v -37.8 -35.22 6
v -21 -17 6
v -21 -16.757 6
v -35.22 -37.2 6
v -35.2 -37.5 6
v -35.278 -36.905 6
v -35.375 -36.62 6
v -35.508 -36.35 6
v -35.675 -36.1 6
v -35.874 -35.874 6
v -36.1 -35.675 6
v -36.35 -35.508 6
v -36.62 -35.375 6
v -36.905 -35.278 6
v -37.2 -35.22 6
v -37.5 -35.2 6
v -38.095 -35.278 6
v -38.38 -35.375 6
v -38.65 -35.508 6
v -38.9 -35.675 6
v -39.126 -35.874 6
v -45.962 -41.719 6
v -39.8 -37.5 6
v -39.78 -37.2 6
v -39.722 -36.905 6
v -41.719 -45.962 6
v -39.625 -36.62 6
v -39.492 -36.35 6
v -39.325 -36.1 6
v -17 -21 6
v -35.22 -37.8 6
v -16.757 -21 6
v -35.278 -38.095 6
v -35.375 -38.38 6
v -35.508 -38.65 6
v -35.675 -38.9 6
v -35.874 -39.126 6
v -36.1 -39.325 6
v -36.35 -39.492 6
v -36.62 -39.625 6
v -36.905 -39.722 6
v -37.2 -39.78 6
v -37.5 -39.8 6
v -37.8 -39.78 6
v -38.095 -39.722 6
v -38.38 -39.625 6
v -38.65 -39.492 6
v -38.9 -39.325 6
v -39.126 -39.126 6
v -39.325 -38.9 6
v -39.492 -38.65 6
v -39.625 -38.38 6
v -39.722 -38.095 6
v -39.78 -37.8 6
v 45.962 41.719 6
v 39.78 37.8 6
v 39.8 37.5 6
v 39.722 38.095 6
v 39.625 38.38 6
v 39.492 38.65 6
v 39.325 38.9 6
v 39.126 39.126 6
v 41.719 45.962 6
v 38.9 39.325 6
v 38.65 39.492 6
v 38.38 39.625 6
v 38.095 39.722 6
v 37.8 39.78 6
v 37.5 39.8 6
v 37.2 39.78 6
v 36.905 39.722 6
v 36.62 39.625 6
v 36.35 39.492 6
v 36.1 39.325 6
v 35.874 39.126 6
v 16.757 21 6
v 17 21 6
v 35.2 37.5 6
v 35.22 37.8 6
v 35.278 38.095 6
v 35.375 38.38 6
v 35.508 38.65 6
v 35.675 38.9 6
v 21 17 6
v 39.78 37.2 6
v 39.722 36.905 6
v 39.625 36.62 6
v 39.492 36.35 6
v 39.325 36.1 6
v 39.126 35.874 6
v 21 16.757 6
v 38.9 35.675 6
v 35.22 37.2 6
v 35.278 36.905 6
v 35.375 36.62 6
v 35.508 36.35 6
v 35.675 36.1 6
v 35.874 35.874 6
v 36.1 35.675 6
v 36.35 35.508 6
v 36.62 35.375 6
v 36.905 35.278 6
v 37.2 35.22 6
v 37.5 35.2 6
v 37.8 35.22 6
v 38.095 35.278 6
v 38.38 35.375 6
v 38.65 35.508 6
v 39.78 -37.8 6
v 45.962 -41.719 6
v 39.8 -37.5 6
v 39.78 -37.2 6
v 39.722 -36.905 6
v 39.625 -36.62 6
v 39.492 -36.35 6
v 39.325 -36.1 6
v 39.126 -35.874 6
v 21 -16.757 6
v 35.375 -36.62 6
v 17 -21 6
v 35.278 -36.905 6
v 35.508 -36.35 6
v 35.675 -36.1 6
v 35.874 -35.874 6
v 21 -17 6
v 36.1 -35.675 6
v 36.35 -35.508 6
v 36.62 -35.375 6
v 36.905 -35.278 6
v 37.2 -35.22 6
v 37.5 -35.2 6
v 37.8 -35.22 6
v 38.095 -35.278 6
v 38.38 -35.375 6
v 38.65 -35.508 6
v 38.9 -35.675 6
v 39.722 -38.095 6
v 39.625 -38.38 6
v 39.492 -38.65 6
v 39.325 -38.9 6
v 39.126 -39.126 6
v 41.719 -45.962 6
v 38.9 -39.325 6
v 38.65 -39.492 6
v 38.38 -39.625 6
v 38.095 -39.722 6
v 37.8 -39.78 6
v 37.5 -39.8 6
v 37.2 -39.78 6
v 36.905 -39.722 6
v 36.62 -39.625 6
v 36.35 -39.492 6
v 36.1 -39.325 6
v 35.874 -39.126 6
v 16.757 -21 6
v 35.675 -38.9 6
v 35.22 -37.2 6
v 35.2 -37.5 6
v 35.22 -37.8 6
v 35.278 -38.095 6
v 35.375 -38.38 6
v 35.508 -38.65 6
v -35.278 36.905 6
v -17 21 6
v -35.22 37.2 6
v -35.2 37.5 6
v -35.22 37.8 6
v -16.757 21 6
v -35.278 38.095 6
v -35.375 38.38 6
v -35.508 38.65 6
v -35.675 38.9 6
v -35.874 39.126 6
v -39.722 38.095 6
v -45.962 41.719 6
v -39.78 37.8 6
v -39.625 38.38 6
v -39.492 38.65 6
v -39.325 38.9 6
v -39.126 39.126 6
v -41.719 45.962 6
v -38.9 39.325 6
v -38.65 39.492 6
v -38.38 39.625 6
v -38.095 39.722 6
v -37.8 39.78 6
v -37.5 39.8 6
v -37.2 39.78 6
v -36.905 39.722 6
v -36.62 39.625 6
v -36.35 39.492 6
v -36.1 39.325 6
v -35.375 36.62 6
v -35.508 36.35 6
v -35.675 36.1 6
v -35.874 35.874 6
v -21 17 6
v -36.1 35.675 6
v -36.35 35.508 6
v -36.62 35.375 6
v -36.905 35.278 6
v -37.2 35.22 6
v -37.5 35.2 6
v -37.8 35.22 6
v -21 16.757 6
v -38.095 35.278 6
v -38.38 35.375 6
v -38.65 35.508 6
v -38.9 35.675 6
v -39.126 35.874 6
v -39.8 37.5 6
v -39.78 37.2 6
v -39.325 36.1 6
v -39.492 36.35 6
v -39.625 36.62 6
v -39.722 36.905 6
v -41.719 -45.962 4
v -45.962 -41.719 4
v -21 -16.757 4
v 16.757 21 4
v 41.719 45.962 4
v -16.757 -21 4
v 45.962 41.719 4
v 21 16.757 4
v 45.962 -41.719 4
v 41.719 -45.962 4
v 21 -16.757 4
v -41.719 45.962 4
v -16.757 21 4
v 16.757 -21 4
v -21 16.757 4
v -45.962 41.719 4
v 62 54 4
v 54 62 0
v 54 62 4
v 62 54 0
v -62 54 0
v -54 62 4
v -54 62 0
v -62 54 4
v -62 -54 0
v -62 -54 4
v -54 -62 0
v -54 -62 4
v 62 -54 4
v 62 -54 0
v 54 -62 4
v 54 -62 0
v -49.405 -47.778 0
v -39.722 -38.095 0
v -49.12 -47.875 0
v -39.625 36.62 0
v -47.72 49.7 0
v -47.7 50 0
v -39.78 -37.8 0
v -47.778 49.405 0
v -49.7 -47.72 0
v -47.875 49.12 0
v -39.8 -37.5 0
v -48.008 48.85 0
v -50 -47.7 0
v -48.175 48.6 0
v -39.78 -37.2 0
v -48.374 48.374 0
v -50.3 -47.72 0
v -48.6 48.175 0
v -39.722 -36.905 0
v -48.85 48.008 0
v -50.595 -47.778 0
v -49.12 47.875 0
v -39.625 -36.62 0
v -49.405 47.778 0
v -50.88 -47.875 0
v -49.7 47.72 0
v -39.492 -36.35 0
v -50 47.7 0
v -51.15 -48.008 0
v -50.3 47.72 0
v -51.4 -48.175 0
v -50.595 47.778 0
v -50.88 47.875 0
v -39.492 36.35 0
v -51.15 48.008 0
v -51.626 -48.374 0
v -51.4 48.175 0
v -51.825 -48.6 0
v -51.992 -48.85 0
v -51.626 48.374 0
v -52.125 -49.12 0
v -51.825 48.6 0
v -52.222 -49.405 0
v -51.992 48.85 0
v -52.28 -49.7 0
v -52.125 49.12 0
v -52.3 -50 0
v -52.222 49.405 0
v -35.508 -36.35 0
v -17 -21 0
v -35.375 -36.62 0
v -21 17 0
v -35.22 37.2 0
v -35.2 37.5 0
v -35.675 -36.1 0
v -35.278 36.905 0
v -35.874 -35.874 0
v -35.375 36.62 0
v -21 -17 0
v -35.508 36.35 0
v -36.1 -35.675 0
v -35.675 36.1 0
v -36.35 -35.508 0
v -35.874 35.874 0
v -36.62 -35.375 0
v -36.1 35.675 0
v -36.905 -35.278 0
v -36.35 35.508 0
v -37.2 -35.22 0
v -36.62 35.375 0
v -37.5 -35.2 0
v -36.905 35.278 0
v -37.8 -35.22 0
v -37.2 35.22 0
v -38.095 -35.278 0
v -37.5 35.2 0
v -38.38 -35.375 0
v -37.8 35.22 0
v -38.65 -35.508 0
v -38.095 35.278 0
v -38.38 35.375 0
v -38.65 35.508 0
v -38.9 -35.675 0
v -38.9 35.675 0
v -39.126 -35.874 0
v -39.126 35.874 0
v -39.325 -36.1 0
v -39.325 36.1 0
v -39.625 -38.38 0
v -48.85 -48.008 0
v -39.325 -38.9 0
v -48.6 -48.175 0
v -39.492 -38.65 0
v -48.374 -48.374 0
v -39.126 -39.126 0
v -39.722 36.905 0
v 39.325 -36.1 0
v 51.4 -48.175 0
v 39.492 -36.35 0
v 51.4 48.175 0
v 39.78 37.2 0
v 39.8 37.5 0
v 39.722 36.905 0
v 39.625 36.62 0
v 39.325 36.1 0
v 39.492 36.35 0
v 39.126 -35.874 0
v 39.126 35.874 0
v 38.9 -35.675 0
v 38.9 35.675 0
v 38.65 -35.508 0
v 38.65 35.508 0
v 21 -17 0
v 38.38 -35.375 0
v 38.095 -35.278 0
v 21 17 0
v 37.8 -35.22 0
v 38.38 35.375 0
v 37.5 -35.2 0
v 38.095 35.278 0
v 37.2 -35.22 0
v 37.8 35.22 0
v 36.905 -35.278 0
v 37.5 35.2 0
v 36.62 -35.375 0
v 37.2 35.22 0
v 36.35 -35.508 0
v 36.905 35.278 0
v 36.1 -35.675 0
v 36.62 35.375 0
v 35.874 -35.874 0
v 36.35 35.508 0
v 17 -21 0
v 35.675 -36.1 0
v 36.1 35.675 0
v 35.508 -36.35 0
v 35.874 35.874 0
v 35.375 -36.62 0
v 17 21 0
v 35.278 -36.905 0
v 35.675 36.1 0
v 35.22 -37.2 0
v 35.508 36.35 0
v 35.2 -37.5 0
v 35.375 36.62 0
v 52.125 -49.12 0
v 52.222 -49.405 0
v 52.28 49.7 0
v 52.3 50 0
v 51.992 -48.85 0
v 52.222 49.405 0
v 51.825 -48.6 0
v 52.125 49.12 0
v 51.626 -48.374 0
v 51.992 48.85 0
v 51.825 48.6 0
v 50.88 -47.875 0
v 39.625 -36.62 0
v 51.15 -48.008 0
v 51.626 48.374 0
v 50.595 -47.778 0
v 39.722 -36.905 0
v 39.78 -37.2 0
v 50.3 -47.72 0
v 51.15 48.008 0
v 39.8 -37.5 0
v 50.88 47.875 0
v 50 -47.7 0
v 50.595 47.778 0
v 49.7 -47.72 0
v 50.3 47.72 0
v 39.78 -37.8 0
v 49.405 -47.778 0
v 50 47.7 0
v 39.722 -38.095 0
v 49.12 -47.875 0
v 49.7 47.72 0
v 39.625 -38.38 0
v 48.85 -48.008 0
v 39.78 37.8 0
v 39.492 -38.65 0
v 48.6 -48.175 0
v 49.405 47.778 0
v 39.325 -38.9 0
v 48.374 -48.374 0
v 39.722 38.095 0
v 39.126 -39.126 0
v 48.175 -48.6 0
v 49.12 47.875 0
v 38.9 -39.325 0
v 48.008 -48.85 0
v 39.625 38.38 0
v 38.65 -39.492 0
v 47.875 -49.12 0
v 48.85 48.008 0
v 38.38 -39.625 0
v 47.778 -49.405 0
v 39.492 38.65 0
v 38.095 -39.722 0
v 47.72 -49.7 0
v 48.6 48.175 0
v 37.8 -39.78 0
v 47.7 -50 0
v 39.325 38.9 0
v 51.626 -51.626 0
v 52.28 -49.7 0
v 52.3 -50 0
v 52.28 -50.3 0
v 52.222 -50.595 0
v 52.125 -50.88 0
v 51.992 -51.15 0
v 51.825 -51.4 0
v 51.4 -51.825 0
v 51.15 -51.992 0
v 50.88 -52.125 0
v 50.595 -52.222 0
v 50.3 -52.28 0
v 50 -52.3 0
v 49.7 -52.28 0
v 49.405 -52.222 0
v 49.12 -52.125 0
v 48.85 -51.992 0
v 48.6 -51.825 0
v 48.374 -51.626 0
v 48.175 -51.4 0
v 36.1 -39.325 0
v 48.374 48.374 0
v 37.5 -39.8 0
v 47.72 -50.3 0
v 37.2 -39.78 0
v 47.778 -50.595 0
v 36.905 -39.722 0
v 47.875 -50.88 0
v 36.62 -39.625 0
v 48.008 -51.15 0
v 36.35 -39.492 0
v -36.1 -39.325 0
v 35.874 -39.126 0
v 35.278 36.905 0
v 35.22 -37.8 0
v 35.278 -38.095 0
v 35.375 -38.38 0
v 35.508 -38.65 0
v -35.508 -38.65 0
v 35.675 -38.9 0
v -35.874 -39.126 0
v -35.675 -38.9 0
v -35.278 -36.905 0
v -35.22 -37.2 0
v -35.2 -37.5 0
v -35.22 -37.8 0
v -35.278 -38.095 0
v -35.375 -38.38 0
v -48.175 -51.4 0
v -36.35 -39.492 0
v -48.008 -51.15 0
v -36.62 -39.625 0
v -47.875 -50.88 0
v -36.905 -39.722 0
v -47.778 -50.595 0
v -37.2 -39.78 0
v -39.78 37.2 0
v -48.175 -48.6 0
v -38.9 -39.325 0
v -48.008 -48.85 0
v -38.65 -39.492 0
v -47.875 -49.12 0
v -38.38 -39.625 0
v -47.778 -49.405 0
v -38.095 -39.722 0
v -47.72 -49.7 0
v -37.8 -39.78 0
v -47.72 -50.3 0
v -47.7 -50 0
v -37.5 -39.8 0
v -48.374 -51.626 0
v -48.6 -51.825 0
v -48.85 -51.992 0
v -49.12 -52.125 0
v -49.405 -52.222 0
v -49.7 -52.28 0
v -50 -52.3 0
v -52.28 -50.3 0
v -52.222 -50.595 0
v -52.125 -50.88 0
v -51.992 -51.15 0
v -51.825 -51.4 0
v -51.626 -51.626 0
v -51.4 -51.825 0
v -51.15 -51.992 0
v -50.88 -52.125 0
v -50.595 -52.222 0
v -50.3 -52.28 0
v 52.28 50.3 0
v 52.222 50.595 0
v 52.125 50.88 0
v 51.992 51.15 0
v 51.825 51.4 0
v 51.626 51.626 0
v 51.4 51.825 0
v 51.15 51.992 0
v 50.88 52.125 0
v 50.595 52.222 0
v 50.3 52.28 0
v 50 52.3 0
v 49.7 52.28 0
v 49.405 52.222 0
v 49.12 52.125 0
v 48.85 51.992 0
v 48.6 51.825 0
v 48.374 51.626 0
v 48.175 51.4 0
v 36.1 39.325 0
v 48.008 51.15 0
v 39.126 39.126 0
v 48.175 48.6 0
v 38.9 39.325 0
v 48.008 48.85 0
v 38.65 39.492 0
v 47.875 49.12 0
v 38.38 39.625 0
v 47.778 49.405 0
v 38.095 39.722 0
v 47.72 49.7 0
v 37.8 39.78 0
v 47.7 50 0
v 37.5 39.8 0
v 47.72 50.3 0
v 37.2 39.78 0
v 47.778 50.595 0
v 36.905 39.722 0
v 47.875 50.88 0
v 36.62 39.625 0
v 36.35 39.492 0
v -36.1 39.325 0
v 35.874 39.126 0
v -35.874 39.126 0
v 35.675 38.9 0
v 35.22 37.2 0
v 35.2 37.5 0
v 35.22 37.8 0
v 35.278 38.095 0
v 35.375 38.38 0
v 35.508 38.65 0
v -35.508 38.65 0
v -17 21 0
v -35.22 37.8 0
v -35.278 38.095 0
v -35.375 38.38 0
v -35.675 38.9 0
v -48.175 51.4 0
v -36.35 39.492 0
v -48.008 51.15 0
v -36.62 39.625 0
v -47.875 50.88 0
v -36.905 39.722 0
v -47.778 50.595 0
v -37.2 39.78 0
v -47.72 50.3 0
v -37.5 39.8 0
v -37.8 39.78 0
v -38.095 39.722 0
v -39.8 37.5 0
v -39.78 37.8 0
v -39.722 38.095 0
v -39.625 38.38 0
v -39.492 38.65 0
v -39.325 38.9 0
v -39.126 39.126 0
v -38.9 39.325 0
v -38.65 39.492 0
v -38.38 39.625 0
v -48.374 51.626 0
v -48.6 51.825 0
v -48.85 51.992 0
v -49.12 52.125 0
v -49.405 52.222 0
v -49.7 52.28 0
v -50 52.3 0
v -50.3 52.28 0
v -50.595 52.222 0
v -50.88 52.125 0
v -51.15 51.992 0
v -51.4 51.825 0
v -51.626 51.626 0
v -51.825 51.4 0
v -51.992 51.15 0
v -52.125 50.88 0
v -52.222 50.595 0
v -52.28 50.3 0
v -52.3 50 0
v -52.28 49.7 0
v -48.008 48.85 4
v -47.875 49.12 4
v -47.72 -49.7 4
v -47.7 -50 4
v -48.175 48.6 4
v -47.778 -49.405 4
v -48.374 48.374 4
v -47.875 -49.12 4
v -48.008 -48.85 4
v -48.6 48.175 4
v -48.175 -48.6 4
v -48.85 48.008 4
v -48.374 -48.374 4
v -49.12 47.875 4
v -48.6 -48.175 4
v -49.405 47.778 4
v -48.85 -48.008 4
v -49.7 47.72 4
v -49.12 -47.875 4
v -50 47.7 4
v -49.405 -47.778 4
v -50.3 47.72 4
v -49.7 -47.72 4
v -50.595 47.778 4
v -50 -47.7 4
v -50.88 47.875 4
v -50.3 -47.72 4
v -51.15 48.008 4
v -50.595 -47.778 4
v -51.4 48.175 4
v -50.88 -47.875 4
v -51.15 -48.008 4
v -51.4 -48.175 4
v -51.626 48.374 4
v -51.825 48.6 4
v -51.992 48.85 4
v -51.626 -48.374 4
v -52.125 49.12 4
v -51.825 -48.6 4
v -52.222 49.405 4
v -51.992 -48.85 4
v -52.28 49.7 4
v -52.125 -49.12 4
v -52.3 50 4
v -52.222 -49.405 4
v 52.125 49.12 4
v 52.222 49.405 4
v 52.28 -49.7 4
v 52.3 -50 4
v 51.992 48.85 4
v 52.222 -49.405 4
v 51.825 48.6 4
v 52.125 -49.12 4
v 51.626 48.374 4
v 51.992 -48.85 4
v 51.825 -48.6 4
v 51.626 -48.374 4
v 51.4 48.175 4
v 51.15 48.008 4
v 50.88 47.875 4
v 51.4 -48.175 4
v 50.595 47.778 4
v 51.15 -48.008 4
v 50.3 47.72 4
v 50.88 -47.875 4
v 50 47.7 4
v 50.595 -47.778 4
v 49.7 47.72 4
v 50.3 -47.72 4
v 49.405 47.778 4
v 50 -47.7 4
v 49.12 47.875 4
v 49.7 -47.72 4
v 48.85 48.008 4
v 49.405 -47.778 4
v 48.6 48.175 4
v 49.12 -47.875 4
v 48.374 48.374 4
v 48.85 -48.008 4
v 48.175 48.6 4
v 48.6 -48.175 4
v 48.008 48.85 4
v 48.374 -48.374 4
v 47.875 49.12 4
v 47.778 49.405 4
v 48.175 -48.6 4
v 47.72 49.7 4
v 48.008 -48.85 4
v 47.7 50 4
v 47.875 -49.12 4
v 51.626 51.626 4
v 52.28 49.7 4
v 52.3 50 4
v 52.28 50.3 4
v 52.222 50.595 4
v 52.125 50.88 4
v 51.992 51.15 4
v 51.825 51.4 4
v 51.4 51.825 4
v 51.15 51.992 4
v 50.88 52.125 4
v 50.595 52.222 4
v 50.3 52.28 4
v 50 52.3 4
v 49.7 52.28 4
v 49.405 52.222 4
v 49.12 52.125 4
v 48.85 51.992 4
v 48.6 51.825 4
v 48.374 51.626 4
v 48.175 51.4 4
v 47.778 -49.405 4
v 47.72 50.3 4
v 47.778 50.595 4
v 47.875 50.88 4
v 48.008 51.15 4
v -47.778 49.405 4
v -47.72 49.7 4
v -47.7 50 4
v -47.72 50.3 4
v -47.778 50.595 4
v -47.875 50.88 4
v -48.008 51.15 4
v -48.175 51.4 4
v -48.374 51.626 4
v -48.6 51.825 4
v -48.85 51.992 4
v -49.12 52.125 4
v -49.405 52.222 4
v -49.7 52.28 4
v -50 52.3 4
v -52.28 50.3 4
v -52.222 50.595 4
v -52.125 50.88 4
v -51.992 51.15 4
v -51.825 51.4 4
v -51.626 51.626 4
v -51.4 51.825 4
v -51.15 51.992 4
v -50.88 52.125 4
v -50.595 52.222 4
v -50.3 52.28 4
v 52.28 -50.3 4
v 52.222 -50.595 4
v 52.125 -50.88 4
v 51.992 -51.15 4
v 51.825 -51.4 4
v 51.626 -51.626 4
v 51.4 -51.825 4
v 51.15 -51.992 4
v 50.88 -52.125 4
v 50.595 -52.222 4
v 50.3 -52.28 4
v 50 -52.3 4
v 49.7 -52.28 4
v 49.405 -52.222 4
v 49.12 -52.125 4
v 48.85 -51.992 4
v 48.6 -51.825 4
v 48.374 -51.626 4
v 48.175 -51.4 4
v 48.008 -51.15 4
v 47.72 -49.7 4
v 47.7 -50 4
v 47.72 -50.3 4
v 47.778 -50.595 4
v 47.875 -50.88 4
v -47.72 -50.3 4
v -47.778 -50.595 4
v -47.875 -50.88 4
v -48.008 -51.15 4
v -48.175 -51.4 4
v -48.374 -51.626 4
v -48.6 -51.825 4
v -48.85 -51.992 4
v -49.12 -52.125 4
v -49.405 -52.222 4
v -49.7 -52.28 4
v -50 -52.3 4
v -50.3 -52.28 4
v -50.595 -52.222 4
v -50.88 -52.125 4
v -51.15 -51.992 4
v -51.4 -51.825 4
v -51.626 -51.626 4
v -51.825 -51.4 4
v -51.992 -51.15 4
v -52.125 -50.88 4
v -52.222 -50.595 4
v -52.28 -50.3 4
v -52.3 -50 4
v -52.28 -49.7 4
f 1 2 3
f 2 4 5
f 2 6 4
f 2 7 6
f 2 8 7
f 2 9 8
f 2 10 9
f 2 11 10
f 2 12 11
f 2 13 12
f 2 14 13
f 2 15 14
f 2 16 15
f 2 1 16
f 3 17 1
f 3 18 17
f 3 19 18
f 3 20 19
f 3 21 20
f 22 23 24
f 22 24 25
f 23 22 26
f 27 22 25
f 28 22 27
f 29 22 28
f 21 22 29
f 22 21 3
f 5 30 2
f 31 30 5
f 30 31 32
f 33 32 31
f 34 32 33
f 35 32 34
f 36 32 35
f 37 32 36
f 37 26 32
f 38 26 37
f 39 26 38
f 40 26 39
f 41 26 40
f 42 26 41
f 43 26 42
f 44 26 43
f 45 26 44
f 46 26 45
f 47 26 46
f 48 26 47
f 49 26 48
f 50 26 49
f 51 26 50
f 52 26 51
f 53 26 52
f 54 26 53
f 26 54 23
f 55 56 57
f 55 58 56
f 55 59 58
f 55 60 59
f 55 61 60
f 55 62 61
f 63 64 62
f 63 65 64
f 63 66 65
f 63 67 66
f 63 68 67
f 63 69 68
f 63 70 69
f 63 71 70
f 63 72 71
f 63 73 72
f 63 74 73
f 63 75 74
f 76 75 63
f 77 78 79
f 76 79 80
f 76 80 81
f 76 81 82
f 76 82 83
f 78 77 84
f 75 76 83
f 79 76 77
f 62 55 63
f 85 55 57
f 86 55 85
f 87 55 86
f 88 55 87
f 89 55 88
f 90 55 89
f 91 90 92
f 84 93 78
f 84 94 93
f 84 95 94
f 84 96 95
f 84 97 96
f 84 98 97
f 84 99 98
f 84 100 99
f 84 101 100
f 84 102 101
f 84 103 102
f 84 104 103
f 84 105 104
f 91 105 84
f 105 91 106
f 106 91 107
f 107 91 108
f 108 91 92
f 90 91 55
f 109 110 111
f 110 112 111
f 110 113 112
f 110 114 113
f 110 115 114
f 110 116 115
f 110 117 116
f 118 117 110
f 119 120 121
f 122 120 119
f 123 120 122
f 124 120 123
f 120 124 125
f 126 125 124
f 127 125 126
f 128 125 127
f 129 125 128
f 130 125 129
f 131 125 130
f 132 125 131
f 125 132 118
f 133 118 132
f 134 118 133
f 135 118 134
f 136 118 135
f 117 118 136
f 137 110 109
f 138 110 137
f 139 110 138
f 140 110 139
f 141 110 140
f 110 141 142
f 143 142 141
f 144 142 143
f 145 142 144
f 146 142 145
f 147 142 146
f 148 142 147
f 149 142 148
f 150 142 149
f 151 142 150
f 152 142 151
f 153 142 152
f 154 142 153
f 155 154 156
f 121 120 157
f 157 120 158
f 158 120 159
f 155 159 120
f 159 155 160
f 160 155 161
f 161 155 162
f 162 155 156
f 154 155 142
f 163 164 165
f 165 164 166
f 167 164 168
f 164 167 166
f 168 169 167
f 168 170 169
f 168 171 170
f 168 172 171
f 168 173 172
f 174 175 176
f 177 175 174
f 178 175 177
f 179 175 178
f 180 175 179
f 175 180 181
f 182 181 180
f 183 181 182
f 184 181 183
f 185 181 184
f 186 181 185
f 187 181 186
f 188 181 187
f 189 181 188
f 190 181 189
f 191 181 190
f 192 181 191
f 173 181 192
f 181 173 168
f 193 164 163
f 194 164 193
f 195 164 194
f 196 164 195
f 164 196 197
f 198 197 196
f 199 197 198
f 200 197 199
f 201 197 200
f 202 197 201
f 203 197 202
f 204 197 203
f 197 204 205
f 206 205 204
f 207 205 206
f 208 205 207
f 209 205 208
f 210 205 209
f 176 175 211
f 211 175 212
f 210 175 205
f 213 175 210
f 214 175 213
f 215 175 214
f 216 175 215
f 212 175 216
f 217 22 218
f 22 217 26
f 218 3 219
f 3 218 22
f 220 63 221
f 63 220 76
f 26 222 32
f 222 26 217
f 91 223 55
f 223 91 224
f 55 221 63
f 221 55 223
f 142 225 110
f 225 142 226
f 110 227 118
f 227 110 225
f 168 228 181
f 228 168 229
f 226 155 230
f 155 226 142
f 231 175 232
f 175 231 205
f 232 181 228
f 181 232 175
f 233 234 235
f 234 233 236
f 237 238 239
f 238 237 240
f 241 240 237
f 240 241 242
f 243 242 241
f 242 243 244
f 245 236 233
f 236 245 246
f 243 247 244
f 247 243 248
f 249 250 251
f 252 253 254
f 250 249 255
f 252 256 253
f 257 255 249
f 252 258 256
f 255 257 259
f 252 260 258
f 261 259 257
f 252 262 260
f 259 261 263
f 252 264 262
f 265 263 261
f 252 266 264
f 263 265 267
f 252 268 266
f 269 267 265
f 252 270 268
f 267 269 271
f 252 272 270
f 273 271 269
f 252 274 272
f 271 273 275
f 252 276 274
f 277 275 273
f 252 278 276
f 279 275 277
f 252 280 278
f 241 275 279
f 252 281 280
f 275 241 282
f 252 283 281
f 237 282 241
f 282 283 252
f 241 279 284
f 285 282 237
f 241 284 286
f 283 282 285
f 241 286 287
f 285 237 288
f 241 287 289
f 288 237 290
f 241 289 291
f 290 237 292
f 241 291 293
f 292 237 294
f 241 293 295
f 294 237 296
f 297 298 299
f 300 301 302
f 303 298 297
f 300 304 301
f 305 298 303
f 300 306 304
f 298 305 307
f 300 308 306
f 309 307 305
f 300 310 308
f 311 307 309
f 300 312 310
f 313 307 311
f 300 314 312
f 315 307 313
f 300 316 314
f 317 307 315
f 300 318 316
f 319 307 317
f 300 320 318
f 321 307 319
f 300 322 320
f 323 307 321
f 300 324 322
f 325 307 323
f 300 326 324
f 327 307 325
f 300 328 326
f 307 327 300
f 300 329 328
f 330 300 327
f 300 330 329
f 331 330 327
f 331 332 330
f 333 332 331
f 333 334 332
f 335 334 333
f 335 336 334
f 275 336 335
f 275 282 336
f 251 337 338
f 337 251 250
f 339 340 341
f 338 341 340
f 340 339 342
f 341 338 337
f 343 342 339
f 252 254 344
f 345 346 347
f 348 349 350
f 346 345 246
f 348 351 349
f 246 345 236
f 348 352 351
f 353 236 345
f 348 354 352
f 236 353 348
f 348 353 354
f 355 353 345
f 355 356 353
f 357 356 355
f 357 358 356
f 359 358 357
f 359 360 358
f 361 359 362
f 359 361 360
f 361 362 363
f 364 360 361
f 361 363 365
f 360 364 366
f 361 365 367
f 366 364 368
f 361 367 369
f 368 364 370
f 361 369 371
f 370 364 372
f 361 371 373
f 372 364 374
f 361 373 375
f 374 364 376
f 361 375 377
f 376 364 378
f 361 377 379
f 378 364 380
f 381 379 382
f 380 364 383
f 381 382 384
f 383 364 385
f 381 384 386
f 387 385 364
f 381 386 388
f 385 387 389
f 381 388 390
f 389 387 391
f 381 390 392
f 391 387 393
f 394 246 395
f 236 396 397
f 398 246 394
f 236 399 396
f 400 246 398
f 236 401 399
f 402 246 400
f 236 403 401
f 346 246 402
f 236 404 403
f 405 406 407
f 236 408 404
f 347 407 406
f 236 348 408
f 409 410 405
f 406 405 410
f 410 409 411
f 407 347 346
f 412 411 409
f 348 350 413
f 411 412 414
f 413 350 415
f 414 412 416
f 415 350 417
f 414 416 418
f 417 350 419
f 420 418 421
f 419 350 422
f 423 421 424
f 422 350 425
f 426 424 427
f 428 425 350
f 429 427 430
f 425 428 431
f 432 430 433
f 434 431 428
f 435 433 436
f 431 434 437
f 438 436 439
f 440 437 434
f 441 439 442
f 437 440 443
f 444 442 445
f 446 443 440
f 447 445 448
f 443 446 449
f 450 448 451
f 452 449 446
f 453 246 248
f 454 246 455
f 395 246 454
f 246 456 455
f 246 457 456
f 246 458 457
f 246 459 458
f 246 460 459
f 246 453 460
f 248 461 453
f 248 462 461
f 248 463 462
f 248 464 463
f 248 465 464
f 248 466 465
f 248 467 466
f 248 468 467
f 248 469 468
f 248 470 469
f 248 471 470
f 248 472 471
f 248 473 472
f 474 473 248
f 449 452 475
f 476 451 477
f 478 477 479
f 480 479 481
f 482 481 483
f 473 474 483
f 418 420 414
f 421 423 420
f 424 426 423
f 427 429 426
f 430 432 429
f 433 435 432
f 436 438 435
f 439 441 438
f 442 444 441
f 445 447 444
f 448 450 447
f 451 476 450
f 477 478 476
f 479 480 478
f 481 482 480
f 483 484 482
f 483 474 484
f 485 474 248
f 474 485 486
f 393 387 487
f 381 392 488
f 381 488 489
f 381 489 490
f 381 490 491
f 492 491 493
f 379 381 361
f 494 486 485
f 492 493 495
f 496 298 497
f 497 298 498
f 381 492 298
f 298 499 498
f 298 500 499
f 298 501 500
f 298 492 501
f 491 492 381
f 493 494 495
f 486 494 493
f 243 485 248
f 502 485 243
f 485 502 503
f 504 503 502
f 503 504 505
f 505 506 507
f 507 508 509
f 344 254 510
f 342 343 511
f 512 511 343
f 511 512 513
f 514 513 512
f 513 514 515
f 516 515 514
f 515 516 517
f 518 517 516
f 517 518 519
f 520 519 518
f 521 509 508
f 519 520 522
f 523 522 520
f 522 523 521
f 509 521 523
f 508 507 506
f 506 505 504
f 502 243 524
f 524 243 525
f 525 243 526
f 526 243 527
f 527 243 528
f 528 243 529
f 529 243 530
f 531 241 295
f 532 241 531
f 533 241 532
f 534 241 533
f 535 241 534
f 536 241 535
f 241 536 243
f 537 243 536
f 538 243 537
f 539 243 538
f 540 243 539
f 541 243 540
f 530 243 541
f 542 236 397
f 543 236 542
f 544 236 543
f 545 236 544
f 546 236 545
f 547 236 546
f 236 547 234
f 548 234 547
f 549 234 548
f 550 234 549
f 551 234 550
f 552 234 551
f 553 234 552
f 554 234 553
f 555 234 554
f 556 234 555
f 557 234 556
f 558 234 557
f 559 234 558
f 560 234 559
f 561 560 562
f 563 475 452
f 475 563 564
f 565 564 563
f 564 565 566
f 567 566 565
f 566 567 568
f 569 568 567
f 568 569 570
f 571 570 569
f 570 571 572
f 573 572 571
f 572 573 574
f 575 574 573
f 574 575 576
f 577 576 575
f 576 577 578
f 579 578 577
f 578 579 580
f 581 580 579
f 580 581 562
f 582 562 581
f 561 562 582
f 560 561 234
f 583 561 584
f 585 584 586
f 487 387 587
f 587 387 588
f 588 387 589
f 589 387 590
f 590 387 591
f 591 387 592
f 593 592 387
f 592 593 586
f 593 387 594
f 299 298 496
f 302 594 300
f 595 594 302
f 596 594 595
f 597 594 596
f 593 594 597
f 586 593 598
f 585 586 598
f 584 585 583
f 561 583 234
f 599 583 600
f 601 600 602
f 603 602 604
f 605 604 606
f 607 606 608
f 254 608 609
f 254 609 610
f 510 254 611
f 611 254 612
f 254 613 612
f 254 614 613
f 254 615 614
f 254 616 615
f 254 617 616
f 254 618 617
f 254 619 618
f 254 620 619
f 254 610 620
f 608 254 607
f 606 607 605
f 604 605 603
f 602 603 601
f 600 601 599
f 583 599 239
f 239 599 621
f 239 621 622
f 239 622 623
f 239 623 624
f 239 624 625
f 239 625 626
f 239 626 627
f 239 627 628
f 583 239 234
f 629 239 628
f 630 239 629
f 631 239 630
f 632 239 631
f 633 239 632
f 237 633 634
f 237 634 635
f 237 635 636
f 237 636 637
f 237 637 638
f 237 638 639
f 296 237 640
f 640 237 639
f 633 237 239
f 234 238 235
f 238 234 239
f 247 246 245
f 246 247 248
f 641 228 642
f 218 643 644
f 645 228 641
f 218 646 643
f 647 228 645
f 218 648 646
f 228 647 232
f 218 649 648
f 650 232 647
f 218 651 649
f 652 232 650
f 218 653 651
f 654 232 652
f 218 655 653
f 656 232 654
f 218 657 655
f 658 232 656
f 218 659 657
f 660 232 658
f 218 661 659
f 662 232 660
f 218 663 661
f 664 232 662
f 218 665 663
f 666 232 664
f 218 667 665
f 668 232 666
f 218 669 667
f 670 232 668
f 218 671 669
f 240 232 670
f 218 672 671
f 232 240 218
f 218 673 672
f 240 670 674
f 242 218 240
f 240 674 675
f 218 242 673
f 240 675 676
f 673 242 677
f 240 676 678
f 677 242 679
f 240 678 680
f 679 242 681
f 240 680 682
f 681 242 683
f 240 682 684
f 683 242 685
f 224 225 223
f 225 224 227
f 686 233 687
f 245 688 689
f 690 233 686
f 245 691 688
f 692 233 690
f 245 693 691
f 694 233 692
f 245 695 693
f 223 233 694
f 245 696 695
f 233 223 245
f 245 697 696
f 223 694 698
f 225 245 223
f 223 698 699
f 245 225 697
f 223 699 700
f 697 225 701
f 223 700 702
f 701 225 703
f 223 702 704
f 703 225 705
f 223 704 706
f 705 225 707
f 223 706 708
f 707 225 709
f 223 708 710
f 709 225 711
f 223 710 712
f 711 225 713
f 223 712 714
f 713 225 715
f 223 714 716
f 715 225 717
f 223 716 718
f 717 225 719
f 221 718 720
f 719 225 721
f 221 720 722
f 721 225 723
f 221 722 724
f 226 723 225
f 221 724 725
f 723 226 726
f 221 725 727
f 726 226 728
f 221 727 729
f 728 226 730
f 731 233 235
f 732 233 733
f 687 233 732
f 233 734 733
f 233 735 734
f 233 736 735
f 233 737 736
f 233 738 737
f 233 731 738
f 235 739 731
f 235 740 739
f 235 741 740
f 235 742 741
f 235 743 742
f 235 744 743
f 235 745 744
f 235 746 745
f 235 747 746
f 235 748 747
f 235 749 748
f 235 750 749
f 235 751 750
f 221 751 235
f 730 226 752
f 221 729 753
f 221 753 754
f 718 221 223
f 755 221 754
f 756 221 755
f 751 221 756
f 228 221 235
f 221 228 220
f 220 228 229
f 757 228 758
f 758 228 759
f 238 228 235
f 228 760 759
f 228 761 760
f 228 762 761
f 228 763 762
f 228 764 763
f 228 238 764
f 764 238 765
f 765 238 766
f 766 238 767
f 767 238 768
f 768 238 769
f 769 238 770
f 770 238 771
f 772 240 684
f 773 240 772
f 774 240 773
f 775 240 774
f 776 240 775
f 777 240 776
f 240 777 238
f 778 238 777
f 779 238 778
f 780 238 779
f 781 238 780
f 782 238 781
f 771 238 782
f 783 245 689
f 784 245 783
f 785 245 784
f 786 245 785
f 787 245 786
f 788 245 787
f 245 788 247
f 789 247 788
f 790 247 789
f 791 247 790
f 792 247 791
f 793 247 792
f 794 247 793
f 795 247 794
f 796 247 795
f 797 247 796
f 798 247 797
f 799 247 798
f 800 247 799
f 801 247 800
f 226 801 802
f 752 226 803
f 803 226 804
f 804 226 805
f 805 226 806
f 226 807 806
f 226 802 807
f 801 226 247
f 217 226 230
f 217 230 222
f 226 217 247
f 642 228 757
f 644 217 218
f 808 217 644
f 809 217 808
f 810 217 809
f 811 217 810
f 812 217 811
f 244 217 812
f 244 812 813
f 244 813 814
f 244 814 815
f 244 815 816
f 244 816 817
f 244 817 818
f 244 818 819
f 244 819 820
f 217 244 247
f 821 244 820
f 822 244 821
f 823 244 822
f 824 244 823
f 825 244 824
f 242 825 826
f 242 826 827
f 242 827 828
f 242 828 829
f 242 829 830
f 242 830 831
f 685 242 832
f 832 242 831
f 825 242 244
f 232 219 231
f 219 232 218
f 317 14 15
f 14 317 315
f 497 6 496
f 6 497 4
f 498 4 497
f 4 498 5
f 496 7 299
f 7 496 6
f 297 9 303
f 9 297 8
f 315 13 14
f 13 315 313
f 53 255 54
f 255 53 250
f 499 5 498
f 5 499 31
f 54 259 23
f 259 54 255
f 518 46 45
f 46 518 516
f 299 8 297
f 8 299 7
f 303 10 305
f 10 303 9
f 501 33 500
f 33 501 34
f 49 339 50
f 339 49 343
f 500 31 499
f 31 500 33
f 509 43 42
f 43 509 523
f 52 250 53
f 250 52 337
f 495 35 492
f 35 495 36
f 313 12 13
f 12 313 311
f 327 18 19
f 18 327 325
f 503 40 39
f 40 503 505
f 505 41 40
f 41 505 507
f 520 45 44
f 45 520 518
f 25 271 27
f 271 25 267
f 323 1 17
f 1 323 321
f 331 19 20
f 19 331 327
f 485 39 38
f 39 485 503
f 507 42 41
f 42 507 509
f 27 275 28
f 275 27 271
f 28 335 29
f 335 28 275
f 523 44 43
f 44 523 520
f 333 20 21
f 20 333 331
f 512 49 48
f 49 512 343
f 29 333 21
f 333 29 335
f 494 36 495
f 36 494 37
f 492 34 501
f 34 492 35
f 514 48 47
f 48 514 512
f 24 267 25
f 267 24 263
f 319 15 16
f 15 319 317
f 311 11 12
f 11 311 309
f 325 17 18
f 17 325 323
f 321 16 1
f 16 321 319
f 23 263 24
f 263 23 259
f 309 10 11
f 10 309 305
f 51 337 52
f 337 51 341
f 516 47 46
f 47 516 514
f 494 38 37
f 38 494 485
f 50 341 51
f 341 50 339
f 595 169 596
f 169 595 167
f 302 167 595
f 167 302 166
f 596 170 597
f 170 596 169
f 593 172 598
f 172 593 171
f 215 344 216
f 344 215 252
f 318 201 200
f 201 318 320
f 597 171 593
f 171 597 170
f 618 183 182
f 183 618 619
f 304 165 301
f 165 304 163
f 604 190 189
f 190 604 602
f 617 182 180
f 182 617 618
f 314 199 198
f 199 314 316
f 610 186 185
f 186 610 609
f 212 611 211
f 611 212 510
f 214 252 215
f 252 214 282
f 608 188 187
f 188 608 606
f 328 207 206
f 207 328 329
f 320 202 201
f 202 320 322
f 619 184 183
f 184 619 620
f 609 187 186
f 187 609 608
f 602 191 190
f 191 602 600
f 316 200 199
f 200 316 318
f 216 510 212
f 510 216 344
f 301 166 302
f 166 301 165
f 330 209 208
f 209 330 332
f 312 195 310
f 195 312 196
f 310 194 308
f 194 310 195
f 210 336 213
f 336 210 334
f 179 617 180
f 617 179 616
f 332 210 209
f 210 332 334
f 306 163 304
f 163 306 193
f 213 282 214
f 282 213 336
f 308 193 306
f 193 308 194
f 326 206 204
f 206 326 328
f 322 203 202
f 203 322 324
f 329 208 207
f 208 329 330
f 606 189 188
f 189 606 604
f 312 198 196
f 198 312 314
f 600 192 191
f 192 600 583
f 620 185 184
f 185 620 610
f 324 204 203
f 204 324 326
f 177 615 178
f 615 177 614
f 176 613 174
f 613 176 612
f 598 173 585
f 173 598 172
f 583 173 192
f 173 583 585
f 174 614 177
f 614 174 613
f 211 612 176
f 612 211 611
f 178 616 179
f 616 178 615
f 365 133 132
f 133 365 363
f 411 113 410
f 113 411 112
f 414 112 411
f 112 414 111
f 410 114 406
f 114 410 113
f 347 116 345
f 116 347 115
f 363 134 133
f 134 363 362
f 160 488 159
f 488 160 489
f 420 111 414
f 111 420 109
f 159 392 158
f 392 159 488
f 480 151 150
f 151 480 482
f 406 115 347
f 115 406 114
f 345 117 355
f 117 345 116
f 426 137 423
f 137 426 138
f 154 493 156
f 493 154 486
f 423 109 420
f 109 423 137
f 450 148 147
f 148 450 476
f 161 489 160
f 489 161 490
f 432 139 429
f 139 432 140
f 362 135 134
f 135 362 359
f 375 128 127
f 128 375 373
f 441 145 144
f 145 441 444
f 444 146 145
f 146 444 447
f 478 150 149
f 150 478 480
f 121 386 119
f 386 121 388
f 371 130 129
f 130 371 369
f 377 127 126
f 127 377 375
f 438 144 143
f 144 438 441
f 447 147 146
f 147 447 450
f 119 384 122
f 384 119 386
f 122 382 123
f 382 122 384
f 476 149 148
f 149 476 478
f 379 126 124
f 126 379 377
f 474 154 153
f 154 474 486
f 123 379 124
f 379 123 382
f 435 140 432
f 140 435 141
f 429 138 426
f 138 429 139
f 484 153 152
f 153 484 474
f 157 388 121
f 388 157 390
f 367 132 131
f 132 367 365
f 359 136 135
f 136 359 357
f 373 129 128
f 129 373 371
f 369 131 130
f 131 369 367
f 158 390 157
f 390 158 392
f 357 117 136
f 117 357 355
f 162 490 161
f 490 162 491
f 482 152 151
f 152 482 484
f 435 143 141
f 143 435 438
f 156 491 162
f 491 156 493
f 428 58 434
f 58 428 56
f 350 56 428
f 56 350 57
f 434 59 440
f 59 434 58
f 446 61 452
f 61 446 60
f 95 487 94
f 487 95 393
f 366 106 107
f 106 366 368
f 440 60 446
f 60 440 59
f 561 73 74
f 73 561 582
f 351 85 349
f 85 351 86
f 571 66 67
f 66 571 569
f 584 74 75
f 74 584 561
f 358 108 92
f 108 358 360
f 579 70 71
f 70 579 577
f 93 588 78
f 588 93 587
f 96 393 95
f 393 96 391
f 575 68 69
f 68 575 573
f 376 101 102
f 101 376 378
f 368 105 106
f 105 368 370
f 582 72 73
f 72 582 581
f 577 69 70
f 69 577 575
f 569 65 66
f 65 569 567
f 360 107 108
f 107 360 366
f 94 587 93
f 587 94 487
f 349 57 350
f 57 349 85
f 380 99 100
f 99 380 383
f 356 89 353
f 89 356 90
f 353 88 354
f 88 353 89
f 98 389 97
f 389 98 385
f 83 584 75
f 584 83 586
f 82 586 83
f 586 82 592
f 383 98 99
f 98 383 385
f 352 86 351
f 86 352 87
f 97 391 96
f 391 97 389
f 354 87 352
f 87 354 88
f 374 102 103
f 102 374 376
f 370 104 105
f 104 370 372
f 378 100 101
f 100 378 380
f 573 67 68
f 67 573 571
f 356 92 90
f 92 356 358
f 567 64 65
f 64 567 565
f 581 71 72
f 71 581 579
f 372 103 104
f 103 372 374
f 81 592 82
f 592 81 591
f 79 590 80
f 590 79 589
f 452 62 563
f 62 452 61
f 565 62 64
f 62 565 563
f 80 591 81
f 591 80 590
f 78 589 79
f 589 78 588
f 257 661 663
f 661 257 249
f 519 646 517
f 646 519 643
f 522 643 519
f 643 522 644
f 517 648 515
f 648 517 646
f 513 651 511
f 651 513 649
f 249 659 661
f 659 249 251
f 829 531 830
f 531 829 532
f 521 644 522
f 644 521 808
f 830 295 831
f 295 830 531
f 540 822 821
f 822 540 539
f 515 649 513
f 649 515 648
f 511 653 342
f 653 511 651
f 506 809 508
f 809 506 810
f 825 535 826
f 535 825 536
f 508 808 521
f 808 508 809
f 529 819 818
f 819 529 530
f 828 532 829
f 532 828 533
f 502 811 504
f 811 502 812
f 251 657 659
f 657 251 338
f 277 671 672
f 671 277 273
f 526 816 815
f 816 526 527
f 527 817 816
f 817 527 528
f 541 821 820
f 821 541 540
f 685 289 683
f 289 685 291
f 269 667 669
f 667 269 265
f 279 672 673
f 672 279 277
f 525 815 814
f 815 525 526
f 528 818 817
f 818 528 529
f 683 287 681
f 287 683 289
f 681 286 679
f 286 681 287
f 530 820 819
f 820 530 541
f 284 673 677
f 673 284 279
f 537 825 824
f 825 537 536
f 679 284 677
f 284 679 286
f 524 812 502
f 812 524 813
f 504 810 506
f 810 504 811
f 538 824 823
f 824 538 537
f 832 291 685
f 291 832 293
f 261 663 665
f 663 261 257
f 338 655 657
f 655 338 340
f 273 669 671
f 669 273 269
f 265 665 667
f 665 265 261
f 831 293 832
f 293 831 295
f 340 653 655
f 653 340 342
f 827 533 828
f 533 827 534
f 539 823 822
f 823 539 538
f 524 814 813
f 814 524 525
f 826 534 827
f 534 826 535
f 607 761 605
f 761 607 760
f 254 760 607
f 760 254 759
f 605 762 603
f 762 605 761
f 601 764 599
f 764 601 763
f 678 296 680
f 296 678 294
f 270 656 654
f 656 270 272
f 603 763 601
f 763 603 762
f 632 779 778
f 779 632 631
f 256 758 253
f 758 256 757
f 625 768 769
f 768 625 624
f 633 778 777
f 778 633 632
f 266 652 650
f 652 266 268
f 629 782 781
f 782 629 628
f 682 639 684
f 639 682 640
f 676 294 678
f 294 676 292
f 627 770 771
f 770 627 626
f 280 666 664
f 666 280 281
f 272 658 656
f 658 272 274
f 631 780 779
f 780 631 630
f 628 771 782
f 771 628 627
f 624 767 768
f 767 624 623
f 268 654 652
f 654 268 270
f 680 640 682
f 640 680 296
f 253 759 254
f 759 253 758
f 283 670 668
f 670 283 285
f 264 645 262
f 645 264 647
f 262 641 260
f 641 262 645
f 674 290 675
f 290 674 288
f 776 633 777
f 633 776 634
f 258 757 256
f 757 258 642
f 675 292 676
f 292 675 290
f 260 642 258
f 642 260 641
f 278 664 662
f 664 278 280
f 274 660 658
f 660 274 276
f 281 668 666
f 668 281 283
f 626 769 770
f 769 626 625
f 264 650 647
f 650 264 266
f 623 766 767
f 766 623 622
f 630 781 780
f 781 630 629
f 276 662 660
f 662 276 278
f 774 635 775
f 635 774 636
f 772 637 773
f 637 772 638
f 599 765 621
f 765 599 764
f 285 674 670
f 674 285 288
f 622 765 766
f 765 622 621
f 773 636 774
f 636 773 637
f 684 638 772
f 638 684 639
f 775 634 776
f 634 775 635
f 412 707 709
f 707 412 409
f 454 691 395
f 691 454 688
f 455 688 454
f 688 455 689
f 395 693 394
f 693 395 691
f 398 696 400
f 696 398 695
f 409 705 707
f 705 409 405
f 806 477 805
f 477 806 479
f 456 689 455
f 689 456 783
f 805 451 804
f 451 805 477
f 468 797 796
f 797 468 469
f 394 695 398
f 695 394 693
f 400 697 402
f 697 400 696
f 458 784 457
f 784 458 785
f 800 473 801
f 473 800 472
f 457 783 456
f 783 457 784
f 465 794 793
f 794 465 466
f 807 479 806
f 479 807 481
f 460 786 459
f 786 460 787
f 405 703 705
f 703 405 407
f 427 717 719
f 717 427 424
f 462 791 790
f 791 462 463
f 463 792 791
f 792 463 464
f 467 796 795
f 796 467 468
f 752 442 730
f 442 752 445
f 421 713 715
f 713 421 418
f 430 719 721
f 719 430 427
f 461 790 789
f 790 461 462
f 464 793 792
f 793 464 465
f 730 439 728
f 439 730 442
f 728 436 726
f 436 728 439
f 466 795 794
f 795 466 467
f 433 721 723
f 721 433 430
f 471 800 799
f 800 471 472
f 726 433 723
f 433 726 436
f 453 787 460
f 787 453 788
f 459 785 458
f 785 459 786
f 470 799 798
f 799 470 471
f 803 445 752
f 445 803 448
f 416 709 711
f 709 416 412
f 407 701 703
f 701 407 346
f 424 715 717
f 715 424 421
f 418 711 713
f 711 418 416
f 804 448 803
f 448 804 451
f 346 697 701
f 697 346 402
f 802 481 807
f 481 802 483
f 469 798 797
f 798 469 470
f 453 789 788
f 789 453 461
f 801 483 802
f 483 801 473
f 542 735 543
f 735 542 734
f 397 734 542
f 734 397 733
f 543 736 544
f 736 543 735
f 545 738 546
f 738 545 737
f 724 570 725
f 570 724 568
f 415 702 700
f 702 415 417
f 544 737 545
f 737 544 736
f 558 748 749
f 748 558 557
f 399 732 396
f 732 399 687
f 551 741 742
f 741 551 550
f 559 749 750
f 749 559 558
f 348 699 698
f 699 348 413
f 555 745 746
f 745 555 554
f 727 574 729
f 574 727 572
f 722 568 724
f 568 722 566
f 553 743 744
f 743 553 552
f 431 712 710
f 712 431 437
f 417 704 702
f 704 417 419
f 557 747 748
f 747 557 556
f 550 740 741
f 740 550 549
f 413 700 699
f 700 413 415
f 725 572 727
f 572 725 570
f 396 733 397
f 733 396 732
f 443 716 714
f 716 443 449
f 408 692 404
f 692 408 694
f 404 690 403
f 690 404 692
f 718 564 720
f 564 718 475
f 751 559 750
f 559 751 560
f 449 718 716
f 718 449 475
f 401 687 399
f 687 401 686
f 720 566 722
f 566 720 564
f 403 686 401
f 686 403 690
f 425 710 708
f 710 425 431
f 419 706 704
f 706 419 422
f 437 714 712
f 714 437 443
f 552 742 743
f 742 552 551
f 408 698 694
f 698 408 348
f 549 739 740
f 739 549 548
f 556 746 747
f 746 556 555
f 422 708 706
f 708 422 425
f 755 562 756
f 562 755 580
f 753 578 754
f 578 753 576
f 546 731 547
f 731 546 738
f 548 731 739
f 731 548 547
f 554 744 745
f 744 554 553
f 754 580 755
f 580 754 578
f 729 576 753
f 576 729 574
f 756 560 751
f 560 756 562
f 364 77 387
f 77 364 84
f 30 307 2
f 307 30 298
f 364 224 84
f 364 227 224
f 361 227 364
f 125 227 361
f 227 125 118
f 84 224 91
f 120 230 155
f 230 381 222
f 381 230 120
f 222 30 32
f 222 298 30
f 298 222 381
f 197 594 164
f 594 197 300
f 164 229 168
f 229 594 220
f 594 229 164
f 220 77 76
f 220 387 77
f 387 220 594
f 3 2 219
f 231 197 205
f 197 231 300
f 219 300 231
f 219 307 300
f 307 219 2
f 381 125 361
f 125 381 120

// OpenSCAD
// 75-to-100 mm VESA adapter plate; print flat with the ribs facing up.
// For light accessories; check fastener length before attaching equipment.
plate_size = 124; // Overall width, mm [116:2:150]
plate_thickness = 4; // Plate thickness, mm [3:0.5:8]
small_spacing = 75; // Inner mounting pattern, mm [60:5:90]
large_spacing = 100; // Outer mounting pattern, mm [95:5:120]
hole_diameter = 4.6; // M4 screw clearance, mm [4.4:0.1:5]
corner_cut = 8; // Corner chamfer, mm [4:1:12]
window_size = 42; // Central cable opening, mm [20:2:50]
rib_width = 6; // Reinforcement width, mm [4:1:10]
rib_height = 2; // Reinforcement height, mm [1.2:0.2:4]
$fn = 48; // Circular resolution
cut_extra = 1; // Boolean cutter overlap, mm

module chamfered_square(size, chamfer) {
    half = size / 2;
    polygon([[-half+chamfer,-half], [half-chamfer,-half],
             [half,-half+chamfer], [half,half-chamfer],
             [half-chamfer,half], [-half+chamfer,half],
             [-half,half-chamfer], [-half,-half+chamfer]]);
}

module mounting_holes(spacing) {
    for (x = [-spacing/2, spacing/2])
        for (y = [-spacing/2, spacing/2])
            translate([x,y,-cut_extra])
                cylinder(h=plate_thickness+rib_height+2*cut_extra, d=hole_diameter);
}

difference() {
    union() {
        linear_extrude(plate_thickness) chamfered_square(plate_size,corner_cut);
        for (angle = [45,135])
            rotate([0,0,angle])
                translate([-plate_size/2,-rib_width/2,plate_thickness-cut_extra])
                    cube([plate_size,rib_width,rib_height+cut_extra]);
    }
    translate([0,0,-cut_extra])
        linear_extrude(plate_thickness+rib_height+2*cut_extra)
            chamfered_square(window_size,corner_cut/2);
    mounting_holes(small_spacing);
    mounting_holes(large_spacing);
}
